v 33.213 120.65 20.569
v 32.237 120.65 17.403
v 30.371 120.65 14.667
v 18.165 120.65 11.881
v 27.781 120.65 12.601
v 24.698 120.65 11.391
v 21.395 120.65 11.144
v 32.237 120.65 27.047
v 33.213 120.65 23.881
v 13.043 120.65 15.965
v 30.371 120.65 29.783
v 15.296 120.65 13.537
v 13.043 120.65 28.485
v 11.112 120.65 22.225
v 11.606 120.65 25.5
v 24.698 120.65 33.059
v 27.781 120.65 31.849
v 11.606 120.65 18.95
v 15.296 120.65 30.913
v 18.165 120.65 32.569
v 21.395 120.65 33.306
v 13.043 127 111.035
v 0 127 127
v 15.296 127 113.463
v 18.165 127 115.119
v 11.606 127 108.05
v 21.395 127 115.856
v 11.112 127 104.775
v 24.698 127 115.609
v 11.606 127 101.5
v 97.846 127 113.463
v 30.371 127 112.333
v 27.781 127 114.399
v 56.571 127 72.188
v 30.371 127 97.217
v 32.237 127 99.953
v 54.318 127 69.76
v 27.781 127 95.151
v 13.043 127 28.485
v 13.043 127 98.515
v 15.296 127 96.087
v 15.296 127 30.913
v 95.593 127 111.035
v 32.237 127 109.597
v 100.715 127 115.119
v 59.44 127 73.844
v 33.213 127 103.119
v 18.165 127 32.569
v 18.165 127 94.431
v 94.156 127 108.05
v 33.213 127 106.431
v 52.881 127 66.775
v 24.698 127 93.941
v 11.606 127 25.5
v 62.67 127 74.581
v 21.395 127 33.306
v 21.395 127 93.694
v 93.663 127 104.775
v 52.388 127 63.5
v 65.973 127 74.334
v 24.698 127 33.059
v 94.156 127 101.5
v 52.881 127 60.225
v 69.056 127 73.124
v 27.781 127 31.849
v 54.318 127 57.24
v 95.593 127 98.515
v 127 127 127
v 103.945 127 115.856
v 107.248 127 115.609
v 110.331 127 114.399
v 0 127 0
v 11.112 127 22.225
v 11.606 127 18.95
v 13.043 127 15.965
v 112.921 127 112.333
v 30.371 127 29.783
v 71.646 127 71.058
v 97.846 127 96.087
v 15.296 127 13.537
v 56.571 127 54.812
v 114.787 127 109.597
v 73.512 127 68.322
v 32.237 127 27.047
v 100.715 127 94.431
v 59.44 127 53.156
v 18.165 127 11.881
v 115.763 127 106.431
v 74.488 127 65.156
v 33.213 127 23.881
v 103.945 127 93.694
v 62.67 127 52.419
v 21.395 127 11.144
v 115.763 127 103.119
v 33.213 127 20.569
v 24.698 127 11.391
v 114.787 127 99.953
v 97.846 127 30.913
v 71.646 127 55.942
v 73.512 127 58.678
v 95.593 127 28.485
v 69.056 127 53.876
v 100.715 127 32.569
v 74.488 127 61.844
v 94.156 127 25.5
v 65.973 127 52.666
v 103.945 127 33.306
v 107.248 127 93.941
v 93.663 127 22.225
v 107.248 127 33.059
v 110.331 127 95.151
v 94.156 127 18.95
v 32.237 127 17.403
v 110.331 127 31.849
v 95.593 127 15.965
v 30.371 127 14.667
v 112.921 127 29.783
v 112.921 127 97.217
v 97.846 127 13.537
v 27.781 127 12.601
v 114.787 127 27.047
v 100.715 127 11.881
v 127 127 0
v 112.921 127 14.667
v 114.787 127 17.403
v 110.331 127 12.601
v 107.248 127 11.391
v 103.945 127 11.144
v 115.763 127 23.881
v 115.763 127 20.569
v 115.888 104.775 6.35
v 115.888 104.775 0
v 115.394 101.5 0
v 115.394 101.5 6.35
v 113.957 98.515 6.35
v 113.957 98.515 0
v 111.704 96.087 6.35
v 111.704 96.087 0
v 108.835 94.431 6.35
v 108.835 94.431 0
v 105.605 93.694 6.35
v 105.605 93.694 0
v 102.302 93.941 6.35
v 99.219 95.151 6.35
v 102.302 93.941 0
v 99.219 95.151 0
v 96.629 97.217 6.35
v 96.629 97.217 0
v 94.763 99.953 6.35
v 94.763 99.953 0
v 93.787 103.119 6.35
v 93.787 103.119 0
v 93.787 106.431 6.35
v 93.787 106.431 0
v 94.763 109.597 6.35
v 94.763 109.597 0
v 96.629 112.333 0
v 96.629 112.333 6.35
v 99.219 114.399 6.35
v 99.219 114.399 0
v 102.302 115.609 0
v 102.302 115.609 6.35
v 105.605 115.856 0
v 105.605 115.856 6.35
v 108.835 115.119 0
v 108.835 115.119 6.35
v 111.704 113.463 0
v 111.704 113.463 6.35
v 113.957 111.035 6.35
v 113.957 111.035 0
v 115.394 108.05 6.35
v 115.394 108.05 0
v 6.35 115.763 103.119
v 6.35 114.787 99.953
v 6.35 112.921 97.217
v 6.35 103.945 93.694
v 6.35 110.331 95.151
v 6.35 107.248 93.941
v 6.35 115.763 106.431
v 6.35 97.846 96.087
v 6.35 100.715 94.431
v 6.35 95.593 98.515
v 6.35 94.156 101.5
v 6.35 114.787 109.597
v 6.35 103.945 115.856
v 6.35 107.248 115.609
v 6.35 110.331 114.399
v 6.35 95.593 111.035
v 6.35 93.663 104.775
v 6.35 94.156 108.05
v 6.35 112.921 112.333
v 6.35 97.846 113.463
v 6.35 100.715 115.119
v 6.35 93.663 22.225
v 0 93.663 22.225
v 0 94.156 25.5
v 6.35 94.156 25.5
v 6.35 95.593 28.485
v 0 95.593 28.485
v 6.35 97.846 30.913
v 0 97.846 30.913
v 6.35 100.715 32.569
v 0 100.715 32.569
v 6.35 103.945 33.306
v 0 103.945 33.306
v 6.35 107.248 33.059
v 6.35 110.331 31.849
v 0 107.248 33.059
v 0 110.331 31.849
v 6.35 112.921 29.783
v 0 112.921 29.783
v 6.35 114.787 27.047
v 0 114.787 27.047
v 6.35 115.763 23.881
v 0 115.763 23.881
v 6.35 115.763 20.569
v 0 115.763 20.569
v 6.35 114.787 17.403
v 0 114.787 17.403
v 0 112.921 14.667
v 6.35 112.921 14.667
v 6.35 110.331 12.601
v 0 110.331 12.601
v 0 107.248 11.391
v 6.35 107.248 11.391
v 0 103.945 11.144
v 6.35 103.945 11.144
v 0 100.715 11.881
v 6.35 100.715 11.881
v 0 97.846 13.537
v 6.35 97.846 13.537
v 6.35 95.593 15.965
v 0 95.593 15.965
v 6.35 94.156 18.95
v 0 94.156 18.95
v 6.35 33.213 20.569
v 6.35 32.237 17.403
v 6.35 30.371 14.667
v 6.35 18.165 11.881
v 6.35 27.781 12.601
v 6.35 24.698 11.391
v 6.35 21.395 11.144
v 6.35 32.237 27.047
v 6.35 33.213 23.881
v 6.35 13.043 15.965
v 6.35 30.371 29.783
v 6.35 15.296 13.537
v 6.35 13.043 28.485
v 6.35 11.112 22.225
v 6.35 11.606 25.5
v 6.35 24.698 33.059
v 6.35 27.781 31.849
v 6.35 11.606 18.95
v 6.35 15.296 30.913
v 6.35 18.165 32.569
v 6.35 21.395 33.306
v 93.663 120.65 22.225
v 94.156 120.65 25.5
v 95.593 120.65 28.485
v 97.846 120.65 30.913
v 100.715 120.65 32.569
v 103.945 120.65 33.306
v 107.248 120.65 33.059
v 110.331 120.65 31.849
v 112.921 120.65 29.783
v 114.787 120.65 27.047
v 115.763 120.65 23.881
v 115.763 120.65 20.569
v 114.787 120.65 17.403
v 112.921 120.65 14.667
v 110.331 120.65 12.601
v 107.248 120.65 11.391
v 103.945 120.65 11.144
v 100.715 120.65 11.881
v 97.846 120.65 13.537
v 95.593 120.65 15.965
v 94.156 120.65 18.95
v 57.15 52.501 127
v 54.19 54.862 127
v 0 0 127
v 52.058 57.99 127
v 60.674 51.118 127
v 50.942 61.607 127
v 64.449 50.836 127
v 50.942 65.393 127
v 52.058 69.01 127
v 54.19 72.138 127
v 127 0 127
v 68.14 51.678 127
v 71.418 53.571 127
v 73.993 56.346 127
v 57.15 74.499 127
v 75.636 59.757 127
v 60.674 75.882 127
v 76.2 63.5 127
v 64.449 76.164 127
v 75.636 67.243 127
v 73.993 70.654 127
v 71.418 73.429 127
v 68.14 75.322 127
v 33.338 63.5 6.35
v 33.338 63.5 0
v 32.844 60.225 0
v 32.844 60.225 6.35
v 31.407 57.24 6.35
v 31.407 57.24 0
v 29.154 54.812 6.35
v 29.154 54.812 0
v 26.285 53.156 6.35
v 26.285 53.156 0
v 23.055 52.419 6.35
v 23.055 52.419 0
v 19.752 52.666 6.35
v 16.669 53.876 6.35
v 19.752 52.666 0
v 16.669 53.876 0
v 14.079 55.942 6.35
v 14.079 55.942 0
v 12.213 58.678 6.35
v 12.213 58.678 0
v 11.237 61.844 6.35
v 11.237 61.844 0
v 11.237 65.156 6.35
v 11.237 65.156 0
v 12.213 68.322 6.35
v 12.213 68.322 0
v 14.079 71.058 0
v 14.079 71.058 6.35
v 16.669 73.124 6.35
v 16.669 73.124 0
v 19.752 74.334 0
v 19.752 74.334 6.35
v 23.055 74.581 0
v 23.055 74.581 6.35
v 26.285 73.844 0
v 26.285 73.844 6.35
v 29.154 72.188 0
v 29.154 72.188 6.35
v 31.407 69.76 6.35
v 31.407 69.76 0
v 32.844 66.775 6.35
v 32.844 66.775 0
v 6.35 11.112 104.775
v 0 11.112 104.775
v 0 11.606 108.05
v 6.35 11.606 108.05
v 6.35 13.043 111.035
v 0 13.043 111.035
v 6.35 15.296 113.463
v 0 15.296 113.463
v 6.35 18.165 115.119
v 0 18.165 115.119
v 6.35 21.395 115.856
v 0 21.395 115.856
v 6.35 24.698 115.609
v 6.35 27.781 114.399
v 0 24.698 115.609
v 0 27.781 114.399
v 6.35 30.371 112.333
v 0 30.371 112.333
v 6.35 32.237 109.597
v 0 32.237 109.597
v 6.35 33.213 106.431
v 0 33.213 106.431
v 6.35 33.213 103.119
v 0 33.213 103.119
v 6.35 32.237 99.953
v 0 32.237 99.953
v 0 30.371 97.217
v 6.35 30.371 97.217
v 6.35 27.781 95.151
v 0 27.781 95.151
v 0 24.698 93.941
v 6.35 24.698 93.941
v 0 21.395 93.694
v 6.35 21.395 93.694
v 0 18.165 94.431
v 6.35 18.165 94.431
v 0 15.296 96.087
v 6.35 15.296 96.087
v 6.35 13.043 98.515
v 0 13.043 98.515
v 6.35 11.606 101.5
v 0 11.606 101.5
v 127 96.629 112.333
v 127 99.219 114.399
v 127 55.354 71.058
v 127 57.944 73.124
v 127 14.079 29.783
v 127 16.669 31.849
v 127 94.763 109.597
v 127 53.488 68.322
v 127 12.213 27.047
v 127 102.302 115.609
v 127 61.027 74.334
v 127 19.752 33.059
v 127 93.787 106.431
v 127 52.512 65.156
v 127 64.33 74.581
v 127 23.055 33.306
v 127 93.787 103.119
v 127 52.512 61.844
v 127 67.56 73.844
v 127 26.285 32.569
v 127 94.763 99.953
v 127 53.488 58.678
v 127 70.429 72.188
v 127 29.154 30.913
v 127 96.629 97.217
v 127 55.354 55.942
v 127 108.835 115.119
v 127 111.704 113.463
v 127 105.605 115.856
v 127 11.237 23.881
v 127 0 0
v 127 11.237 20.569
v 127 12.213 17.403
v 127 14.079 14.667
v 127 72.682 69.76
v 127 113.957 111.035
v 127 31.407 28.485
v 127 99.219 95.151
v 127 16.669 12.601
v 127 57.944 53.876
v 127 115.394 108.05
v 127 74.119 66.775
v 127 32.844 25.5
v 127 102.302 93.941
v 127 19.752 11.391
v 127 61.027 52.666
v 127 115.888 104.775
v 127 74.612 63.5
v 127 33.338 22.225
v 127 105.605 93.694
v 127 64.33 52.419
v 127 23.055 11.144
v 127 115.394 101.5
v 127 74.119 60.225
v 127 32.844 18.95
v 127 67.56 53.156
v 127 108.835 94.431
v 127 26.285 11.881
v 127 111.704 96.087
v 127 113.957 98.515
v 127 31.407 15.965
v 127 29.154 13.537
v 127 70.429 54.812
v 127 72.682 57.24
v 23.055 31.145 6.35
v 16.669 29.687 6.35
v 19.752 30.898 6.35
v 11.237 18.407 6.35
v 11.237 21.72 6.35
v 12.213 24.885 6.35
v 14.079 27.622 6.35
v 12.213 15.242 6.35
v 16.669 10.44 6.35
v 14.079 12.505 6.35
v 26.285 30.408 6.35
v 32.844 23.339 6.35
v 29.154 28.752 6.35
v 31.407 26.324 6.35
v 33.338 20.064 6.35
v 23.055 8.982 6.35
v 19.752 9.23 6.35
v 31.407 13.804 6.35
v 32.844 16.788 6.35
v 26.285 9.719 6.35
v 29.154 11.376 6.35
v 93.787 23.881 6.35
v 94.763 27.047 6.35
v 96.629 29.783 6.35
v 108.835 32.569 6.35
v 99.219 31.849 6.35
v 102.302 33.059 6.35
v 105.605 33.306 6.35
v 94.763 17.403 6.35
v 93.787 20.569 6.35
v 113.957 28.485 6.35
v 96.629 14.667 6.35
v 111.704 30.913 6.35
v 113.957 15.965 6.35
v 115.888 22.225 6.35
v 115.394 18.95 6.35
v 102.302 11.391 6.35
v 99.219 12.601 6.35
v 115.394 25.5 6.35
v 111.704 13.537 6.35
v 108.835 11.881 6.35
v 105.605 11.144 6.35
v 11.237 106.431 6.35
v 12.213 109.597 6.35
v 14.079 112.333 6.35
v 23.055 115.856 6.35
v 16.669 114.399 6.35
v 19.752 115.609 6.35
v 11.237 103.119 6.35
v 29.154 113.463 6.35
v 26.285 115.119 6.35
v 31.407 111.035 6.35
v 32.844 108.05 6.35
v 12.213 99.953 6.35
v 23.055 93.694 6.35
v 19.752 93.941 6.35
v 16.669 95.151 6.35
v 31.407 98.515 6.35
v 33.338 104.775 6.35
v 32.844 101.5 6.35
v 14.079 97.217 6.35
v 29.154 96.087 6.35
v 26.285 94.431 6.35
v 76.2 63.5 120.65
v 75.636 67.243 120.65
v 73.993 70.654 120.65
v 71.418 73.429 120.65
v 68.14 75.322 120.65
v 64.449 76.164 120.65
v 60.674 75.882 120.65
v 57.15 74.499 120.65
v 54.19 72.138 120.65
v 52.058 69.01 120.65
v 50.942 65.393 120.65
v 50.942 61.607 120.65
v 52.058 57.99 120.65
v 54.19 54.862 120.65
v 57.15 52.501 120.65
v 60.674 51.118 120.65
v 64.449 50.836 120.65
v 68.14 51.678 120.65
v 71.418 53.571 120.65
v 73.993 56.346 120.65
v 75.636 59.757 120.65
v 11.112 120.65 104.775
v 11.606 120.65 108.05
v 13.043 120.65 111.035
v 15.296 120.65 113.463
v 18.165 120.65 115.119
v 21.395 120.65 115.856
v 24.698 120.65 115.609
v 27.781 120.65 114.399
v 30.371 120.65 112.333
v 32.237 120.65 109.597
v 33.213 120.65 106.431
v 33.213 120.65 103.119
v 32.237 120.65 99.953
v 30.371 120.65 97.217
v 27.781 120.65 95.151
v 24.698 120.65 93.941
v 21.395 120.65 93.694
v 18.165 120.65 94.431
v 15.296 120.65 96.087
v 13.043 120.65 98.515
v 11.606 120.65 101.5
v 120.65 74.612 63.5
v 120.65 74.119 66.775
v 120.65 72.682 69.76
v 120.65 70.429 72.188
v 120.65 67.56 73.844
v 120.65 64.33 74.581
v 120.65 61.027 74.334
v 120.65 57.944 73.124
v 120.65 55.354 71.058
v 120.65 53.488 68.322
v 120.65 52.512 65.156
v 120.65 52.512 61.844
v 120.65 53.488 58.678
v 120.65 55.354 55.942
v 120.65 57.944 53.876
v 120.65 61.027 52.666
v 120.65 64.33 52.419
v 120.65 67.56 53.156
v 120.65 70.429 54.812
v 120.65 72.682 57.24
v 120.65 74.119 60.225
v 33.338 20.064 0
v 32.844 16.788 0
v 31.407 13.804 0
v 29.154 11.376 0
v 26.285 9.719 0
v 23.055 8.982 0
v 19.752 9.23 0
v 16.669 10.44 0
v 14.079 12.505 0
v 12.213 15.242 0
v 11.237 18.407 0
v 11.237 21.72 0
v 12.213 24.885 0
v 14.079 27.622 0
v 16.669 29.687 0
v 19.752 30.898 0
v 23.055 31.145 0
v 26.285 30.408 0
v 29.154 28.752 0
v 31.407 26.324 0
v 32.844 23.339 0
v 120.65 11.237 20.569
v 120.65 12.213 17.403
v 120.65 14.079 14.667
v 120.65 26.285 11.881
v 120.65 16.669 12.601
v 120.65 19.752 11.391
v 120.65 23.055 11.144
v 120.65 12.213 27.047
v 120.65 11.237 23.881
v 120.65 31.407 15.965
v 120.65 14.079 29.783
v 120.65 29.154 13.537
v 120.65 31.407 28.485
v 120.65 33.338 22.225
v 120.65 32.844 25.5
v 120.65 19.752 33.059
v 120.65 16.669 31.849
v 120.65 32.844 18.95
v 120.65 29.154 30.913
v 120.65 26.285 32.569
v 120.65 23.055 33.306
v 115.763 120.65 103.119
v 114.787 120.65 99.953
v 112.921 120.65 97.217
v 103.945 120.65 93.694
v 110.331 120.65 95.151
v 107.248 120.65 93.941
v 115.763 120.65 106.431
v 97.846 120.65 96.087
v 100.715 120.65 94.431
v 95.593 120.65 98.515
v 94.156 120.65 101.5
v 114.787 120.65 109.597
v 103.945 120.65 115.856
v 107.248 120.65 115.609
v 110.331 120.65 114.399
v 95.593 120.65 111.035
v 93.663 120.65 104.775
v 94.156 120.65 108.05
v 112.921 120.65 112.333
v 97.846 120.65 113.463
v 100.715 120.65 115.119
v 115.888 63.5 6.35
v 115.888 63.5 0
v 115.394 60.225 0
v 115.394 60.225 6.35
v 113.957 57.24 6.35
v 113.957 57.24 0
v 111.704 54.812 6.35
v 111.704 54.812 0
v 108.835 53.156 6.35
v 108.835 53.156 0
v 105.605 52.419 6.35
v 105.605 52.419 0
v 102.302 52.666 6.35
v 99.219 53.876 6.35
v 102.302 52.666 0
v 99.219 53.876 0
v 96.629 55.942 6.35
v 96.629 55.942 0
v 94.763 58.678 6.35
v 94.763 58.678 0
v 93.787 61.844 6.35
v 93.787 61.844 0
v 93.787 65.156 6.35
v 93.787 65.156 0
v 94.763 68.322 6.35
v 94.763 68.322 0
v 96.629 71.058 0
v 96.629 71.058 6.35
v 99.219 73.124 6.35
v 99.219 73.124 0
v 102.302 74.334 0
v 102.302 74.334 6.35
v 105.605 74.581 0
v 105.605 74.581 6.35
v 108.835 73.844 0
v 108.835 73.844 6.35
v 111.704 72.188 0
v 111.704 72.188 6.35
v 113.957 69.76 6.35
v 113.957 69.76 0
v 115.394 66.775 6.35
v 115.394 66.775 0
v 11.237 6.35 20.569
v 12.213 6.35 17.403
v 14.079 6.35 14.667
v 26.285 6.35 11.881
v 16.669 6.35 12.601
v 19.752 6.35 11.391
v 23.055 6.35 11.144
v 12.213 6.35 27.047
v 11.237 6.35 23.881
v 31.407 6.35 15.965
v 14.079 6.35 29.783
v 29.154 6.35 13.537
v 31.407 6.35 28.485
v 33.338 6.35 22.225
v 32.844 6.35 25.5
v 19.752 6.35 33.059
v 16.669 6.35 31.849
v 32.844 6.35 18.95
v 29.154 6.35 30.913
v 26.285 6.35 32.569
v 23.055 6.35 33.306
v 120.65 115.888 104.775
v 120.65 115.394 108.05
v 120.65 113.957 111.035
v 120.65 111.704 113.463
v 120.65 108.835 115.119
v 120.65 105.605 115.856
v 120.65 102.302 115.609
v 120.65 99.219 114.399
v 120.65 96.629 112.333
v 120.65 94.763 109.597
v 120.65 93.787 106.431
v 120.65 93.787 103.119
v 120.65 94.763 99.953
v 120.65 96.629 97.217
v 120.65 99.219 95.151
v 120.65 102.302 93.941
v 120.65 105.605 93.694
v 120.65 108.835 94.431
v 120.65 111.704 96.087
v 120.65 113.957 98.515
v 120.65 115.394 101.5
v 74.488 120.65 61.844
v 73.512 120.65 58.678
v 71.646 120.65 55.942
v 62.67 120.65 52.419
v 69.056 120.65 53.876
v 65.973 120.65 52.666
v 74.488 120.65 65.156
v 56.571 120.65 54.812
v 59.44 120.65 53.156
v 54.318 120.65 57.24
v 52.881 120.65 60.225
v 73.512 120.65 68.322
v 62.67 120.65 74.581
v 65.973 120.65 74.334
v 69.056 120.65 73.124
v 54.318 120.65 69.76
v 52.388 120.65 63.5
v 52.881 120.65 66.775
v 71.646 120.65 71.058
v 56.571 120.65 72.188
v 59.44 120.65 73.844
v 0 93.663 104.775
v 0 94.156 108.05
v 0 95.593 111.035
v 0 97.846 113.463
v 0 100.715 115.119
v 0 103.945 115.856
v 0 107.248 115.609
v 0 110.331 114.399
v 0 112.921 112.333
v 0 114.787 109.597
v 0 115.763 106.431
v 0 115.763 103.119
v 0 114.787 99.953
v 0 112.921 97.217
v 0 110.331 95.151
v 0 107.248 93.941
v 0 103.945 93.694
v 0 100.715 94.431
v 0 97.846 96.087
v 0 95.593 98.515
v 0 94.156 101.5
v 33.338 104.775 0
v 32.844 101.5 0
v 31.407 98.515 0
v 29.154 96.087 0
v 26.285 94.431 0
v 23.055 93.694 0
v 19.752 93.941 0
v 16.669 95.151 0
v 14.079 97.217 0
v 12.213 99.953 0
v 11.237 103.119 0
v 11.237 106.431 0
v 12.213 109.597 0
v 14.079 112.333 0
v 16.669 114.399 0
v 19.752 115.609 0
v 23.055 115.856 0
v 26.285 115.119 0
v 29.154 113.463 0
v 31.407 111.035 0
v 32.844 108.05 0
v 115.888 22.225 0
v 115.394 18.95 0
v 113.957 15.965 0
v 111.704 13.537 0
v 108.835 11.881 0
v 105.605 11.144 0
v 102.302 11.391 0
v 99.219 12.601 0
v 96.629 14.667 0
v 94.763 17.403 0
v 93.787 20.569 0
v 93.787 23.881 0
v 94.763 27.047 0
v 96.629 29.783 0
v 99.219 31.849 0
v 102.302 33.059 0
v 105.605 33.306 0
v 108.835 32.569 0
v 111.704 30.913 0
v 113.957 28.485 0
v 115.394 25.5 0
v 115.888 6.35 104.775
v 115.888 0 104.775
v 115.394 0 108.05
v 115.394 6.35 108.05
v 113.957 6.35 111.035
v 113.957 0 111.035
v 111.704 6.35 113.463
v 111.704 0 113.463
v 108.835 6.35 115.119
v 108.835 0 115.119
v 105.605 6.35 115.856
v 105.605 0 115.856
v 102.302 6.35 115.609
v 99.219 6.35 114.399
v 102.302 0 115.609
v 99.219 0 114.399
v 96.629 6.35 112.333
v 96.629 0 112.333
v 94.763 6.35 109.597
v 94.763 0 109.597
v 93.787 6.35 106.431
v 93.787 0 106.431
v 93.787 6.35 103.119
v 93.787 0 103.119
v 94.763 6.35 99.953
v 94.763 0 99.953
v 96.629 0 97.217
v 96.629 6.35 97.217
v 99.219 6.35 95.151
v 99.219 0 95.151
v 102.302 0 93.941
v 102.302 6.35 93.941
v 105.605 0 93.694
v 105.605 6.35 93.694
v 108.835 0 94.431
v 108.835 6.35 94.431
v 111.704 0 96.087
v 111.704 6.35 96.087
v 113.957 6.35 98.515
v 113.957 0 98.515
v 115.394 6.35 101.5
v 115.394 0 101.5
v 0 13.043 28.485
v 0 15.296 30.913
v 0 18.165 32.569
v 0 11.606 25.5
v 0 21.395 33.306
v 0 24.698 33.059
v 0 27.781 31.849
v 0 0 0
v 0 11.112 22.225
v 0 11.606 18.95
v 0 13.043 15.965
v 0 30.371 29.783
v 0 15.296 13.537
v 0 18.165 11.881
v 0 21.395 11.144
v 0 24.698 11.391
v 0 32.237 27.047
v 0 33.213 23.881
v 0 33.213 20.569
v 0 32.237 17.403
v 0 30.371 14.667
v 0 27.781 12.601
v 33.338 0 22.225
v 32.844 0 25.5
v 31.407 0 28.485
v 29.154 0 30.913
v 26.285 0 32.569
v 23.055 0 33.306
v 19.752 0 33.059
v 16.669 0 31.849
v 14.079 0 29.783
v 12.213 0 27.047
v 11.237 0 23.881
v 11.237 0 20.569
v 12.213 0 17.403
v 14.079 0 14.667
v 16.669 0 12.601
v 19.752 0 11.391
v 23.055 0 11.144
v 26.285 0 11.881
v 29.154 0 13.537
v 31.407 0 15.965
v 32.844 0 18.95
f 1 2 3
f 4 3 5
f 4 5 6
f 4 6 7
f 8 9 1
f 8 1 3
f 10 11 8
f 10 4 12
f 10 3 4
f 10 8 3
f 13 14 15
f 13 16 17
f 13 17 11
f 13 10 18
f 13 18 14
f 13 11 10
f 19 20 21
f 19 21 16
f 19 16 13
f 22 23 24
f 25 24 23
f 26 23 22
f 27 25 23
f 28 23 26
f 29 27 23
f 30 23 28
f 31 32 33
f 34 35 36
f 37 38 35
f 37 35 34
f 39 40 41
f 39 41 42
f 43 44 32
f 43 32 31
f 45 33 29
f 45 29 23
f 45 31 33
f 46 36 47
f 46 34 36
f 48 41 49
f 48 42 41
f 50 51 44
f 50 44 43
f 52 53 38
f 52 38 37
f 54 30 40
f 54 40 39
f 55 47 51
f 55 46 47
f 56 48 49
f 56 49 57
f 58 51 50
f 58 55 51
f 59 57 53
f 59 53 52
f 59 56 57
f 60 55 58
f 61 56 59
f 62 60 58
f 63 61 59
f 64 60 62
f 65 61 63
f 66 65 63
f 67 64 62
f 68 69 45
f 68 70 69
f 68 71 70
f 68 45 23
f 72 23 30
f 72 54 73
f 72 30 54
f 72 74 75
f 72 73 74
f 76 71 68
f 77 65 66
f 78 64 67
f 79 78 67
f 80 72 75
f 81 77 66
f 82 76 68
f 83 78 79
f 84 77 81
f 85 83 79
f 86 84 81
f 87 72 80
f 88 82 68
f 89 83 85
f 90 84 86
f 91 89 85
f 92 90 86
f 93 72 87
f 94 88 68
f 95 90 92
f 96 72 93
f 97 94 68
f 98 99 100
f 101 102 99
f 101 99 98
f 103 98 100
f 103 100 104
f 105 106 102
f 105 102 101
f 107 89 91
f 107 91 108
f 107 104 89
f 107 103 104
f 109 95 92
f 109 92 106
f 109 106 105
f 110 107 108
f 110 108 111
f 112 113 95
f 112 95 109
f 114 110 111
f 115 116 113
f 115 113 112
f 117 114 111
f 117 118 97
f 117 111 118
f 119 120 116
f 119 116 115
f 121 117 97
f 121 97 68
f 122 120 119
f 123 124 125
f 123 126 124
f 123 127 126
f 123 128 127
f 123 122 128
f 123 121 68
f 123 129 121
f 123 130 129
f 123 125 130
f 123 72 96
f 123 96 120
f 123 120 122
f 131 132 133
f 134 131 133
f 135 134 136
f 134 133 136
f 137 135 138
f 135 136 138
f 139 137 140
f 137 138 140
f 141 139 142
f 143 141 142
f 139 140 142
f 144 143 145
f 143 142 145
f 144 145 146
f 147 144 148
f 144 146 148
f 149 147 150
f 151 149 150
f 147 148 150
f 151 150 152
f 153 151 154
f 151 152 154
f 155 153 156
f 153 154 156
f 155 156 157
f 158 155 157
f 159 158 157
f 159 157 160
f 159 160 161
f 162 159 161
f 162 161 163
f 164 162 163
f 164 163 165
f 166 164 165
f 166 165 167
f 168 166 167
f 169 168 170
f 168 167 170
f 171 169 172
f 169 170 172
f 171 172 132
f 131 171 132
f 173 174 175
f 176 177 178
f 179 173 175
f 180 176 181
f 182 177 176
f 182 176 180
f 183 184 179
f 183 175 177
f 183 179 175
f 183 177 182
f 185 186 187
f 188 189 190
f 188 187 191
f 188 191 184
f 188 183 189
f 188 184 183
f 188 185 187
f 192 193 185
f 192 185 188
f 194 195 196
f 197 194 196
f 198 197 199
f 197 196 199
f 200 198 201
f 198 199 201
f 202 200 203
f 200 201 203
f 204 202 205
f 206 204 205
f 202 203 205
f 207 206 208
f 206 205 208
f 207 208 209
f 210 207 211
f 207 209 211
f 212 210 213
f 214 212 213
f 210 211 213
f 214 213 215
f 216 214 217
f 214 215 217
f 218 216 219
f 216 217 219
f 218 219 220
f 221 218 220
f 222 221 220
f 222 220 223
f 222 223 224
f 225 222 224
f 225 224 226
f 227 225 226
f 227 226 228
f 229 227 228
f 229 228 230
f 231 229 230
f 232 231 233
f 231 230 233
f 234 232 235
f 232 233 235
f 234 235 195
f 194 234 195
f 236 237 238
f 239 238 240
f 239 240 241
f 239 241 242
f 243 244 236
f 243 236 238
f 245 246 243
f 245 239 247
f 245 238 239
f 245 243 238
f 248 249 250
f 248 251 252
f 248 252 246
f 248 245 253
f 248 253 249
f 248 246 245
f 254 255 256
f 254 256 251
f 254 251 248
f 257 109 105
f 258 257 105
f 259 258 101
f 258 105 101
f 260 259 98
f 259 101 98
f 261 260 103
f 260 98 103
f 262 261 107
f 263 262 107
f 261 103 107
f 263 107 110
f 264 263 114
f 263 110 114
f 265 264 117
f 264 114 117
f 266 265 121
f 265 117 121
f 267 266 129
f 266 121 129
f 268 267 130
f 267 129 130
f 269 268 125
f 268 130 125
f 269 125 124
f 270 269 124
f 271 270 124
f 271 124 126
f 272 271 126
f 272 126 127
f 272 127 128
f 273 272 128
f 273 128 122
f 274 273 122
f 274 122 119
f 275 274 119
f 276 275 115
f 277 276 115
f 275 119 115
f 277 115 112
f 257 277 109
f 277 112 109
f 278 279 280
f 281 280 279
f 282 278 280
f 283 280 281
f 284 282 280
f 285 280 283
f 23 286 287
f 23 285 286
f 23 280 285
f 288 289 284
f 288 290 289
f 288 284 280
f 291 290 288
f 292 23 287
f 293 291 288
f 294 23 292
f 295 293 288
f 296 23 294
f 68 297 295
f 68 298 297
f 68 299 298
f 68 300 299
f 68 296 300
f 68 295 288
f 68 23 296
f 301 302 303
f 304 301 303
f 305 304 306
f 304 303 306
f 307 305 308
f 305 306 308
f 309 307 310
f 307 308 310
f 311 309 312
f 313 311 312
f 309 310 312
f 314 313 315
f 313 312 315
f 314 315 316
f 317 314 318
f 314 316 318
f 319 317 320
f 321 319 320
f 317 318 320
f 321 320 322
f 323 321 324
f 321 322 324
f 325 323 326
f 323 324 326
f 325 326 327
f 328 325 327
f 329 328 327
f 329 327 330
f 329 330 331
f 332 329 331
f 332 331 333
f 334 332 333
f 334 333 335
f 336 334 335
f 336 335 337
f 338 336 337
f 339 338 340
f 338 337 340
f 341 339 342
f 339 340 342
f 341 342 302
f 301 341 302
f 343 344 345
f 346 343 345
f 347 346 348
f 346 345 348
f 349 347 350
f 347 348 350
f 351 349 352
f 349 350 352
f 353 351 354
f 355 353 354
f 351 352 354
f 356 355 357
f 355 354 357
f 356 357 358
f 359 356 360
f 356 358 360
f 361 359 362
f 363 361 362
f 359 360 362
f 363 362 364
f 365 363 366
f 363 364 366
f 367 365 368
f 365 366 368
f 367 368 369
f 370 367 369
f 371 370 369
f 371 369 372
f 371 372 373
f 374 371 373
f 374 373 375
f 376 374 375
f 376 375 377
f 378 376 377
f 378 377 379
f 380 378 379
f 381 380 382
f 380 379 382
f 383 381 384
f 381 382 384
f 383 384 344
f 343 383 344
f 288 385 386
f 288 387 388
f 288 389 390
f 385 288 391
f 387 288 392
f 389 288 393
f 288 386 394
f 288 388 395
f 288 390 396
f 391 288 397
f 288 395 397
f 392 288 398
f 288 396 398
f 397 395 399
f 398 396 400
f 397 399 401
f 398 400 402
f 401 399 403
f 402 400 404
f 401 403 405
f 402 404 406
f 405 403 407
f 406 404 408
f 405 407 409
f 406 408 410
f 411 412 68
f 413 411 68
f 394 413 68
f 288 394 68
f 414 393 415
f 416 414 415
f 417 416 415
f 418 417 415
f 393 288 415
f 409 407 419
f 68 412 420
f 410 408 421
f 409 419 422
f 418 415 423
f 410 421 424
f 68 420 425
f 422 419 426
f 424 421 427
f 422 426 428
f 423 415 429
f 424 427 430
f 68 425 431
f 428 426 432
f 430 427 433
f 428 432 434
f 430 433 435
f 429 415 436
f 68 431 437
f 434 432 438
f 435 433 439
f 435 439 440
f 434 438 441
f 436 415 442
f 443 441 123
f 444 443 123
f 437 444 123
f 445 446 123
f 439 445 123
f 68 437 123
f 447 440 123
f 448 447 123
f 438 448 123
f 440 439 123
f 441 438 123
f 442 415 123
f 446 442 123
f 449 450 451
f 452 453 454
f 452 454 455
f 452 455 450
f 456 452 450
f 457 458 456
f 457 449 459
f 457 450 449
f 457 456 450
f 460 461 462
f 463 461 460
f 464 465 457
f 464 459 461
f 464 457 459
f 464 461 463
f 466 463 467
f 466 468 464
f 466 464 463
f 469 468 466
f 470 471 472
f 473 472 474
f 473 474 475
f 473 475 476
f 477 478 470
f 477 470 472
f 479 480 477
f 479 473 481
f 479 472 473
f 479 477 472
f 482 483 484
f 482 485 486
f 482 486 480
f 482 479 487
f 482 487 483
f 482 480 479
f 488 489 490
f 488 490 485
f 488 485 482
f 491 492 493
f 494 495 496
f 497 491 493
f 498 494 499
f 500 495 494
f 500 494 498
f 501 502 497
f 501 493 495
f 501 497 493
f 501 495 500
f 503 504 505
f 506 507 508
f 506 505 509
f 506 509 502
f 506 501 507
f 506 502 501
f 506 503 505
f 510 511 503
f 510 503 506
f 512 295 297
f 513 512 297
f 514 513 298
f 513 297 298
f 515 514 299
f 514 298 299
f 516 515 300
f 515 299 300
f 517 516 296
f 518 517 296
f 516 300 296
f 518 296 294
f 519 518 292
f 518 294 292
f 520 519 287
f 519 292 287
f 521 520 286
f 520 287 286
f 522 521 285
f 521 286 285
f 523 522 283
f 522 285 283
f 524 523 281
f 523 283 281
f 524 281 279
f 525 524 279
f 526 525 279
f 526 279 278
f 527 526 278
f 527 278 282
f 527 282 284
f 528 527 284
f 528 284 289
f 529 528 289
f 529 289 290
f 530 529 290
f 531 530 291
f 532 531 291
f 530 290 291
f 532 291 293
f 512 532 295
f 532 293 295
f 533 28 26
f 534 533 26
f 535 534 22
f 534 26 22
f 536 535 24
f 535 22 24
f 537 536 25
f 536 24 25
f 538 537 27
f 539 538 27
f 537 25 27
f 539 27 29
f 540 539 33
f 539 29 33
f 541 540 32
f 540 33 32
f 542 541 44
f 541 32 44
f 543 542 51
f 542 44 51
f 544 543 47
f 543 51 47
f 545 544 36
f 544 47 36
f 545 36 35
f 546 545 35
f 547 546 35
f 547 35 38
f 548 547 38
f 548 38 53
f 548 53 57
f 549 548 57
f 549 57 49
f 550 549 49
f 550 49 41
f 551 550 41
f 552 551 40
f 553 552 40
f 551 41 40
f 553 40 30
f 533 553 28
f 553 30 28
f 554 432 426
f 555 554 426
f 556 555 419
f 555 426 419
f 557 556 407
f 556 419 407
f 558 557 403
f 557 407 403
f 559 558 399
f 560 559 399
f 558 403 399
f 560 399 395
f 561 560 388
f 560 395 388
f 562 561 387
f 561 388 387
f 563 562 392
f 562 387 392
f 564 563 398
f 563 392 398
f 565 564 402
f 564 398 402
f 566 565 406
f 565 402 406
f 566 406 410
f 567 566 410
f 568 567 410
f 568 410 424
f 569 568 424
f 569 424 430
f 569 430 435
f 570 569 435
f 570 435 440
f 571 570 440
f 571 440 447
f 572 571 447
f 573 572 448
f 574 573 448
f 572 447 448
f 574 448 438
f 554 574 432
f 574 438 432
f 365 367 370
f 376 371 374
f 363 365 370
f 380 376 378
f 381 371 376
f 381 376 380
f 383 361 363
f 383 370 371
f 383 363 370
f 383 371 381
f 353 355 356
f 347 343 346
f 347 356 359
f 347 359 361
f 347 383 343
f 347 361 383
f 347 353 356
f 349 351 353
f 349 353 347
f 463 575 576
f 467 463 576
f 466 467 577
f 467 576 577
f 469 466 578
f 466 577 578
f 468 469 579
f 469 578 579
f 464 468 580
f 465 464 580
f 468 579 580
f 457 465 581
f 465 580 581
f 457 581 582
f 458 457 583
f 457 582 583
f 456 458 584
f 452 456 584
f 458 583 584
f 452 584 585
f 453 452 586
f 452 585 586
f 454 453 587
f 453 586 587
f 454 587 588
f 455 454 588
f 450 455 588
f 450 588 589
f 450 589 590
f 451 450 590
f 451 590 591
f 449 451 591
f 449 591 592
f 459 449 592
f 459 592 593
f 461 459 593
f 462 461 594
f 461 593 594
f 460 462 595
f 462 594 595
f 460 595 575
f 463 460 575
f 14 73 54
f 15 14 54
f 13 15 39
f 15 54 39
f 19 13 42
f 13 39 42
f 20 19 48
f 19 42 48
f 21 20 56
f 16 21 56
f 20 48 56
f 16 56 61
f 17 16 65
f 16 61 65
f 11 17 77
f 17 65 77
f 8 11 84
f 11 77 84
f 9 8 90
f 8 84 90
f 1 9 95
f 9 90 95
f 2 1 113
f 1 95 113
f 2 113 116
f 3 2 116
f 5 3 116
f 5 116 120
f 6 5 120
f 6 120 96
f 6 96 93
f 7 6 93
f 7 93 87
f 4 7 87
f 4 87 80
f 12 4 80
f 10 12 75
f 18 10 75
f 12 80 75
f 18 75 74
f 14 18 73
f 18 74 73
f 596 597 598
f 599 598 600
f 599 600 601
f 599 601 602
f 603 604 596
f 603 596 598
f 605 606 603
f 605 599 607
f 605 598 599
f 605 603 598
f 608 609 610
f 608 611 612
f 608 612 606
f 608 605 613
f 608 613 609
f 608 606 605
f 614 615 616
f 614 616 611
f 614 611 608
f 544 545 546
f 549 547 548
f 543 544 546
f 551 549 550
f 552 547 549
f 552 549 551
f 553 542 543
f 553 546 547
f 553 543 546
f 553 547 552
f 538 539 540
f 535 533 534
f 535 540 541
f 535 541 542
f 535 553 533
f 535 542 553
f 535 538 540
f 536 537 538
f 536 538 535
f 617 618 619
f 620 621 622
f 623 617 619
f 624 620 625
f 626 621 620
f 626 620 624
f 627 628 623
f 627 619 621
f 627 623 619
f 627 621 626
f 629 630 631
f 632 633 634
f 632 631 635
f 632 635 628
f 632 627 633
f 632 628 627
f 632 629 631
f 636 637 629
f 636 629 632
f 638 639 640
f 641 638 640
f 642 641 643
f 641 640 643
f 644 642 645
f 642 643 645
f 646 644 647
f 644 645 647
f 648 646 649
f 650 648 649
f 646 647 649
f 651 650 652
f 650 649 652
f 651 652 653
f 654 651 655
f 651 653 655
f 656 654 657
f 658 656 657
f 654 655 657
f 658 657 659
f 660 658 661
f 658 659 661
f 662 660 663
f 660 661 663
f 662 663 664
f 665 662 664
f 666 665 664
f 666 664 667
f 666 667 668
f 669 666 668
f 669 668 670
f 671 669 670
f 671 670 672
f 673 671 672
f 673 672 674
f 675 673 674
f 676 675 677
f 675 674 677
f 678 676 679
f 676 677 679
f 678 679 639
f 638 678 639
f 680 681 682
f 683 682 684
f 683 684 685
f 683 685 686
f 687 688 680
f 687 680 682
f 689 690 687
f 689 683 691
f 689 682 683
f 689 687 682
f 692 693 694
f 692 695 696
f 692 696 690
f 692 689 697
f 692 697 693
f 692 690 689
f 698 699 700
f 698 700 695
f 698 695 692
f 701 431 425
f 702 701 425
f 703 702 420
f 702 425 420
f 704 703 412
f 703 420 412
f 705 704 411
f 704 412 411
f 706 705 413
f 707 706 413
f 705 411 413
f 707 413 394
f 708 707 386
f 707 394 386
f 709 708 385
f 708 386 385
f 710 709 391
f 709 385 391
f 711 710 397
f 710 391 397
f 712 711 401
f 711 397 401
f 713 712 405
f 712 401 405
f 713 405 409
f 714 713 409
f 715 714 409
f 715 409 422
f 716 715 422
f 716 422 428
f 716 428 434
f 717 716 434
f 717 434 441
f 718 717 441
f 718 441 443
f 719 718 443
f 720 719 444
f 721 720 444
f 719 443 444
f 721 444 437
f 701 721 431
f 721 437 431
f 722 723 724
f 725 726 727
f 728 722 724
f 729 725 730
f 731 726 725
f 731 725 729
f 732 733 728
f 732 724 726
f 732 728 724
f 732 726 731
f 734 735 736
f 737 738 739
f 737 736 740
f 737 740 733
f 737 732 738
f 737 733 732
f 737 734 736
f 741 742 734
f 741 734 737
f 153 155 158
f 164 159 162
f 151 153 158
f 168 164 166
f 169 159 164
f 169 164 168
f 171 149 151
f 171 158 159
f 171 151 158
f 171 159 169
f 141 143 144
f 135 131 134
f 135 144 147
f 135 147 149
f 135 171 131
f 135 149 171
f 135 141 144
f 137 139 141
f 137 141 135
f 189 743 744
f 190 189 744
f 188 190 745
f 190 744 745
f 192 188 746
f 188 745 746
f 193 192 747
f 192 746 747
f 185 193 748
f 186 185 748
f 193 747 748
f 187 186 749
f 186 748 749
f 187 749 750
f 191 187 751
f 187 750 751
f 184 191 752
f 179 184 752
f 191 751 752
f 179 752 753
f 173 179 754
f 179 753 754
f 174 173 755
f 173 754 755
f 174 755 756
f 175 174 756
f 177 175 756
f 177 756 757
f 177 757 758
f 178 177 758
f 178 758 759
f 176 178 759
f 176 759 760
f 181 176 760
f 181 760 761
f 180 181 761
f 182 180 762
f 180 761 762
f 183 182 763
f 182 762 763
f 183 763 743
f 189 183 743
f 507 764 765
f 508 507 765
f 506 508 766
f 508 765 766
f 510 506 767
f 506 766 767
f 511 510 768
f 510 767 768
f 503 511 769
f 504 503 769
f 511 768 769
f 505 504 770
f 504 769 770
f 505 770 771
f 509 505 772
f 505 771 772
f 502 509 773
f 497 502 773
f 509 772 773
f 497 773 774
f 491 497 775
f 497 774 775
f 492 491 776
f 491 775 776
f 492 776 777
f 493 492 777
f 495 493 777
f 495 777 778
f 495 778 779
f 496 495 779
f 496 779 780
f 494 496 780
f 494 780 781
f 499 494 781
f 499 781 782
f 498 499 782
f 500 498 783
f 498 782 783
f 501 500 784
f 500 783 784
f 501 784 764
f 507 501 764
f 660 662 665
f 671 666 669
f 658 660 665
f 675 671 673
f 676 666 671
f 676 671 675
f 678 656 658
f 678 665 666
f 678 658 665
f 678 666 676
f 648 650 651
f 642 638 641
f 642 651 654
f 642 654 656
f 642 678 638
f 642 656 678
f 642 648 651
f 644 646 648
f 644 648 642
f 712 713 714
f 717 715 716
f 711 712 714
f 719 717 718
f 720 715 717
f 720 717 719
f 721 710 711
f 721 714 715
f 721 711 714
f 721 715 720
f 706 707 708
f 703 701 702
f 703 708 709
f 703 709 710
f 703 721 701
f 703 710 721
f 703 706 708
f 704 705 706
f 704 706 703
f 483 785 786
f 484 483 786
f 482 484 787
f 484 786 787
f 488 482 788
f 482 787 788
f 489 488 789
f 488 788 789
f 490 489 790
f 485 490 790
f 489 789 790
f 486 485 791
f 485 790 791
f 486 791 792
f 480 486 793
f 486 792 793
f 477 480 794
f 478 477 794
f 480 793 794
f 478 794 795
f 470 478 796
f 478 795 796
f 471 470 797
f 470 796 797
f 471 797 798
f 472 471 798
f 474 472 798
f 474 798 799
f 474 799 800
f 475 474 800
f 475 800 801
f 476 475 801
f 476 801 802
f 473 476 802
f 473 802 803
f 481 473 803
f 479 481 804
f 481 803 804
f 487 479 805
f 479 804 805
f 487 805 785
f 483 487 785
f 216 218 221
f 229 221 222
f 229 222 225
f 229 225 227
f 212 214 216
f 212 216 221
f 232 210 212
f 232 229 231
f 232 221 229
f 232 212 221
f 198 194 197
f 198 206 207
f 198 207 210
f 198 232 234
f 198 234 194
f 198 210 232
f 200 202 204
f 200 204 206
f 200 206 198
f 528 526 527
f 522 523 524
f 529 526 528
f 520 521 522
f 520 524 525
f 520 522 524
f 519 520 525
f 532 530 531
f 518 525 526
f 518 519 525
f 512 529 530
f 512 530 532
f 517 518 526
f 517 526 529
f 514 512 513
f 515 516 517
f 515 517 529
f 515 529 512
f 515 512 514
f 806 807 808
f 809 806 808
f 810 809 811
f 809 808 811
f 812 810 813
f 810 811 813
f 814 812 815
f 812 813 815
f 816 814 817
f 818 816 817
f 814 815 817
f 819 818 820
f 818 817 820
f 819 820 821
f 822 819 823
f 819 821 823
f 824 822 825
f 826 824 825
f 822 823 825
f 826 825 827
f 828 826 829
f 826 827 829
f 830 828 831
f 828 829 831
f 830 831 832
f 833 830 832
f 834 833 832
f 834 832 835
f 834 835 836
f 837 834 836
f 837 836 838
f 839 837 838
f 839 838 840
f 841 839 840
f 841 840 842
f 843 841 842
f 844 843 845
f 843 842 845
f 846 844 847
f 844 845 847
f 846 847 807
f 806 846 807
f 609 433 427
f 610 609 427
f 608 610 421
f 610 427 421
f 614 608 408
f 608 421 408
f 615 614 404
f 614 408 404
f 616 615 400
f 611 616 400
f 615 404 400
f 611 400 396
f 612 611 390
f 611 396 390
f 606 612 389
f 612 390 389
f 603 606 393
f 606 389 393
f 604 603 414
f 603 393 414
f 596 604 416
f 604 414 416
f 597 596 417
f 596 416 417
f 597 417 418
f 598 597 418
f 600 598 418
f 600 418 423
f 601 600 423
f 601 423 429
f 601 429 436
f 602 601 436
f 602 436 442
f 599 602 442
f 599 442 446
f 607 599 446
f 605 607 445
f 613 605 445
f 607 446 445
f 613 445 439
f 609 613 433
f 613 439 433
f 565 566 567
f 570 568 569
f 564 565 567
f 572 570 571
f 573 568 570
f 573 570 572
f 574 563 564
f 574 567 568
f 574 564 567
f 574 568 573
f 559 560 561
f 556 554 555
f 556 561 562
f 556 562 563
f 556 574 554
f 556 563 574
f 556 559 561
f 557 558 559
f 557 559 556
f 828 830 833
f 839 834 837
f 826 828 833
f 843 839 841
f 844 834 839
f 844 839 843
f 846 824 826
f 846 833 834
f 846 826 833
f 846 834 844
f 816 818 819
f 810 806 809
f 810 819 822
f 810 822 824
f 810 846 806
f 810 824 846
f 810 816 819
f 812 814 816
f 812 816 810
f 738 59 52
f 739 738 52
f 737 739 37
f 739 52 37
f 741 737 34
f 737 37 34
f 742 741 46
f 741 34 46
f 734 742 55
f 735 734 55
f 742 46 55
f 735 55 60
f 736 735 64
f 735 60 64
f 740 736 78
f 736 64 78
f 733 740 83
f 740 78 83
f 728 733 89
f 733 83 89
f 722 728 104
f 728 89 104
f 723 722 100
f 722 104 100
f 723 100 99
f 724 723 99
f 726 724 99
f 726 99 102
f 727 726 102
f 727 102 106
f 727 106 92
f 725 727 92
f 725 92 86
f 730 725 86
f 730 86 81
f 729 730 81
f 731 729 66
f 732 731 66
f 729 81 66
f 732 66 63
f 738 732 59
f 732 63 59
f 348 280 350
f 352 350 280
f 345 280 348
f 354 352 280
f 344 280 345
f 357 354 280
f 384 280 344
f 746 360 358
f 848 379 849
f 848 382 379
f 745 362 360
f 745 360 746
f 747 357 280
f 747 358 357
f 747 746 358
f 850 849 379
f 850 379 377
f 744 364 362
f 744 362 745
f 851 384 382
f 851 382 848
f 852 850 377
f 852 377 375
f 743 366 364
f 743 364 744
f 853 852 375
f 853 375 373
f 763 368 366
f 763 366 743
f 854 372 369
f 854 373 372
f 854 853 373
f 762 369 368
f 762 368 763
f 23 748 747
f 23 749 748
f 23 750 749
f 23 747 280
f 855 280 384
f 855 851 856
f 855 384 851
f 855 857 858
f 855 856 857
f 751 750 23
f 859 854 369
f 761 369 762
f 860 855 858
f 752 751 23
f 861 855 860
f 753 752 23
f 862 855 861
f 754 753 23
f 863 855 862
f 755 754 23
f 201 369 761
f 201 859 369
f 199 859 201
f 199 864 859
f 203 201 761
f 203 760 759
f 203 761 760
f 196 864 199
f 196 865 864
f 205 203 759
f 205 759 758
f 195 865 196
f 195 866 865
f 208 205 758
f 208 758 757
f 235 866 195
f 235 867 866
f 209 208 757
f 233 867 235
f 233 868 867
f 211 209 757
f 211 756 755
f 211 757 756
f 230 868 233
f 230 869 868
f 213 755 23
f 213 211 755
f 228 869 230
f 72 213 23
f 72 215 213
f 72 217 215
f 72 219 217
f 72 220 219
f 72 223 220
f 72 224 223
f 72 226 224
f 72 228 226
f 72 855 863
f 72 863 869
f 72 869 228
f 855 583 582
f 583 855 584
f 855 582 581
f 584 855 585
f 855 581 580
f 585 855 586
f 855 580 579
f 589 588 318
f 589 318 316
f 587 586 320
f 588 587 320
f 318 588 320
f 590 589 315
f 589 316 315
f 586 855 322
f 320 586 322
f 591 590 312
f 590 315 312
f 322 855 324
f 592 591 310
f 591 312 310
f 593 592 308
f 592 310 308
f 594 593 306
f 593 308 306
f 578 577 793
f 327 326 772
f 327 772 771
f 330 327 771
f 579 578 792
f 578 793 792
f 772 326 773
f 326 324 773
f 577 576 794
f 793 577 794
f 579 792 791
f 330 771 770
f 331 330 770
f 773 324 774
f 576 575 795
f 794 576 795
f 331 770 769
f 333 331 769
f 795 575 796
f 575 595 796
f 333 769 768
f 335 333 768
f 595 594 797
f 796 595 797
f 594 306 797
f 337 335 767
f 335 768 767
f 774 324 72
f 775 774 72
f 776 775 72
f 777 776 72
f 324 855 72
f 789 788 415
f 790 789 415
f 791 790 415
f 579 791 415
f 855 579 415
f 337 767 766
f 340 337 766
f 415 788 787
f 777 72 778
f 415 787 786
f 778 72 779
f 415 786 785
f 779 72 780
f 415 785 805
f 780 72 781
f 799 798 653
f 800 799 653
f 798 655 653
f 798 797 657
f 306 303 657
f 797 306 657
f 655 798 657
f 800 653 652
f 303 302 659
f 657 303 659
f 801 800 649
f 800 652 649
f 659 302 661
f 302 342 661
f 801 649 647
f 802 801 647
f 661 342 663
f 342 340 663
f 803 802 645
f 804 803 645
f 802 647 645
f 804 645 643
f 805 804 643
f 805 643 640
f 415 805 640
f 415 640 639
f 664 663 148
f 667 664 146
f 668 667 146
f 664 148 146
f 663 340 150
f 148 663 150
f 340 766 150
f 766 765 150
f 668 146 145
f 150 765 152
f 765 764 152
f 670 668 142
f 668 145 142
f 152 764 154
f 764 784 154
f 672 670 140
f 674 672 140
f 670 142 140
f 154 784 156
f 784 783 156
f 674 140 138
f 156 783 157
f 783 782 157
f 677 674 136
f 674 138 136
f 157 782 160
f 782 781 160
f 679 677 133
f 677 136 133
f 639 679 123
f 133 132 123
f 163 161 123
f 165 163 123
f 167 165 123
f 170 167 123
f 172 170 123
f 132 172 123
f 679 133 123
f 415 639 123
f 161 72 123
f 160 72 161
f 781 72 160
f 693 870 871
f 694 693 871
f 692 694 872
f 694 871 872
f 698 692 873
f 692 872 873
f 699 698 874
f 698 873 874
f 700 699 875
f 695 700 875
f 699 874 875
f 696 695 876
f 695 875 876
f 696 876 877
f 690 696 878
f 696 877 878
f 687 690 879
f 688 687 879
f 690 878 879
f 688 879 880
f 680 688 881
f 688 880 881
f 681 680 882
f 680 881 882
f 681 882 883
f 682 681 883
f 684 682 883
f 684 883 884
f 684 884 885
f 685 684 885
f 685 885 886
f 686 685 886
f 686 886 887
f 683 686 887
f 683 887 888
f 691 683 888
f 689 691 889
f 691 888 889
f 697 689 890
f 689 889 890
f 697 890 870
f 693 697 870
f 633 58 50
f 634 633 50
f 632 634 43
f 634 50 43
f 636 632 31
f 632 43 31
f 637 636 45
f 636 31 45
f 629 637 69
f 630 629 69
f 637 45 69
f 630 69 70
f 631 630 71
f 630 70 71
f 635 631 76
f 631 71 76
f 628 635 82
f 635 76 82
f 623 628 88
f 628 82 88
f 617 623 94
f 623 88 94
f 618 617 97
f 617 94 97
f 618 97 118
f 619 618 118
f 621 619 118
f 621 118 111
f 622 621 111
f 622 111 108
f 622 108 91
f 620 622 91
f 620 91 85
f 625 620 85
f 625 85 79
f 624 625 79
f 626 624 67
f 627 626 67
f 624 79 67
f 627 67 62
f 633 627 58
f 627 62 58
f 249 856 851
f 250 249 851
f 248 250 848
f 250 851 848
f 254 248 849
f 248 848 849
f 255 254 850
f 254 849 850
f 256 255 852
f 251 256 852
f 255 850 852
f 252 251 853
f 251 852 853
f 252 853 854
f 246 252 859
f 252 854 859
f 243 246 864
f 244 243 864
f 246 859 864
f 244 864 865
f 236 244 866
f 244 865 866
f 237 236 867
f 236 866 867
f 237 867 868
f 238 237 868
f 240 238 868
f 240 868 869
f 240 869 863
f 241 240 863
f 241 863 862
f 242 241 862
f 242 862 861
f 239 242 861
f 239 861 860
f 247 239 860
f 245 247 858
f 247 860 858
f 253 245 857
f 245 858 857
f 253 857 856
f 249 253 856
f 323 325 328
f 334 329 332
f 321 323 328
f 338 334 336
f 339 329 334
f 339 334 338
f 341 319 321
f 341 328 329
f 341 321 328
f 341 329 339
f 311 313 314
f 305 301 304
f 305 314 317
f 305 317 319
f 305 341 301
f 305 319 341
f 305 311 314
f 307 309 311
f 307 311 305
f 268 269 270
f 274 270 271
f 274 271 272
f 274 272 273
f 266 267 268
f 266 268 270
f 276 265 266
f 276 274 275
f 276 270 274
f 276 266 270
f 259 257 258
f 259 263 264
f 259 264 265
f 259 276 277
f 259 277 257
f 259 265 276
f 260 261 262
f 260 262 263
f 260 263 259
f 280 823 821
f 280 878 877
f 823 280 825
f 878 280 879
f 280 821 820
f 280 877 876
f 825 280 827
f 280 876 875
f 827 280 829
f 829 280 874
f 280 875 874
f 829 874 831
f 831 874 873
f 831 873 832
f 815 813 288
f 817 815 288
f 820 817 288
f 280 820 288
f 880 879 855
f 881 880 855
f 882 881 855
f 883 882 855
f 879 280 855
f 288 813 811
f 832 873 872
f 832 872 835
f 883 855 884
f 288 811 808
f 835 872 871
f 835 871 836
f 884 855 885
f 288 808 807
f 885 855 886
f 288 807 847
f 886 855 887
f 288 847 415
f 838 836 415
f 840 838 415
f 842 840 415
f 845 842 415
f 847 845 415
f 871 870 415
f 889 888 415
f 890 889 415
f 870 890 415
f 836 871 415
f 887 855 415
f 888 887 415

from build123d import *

# Parameters (mm, degrees)
F0_W      = 127
F0_H      = 127
F1_DEPTH  = 127
F2_R      = 12.7
F3_DEPTH  = 6.35
F4_R      = 11.1125
F5_DEPTH  = 6.35
F6_R      = 11.1125
F7_DEPTH  = 6.35
F8_R      = 11.1125
F9_DEPTH  = 6.35
F10_R     = 11.1125
F11_DEPTH = 6.35
F12_R     = 11.1125
F13_DEPTH = 6.35


with BuildPart() as f1:
    # F0 (on Top) → F1 (new body)
    with BuildSketch(Plane.XY):
        with Locations((63.5, 63.5)):
            Rectangle(F0_W, F0_H)
    extrude(amount=F1_DEPTH)

    # F2 (on face) → F3 (cut)
    with BuildSketch(Plane.XY.offset(127)):
        with Locations((63.5, 63.5)):
            Circle(F2_R)
    extrude(amount=-F3_DEPTH, mode=Mode.SUBTRACT)

    # F4 (on face) → F5 (cut)
    with BuildSketch(Plane.XZ):
        with Locations((22.225, 22.225)):
            Circle(F4_R)
        with Locations((104.775, 104.775)):
            Circle(F4_R)
    extrude(amount=-F5_DEPTH, mode=Mode.SUBTRACT)

    # F6 (on face) → F7 (cut)
    with BuildSketch(Plane.YZ.offset(127)):
        with Locations((63.5, 63.5)):
            Circle(F6_R)
        with Locations((22.225, 22.225)):
            Circle(F6_R)
        with Locations((104.775, 104.775)):
            Circle(F6_R)
    extrude(amount=-F7_DEPTH, mode=Mode.SUBTRACT)

    # F8 (on face) → F9 (cut)
    with BuildSketch(Plane(origin=(0, 0, 0), x_dir=(0, -1, 0), z_dir=(-1, 0, 0))):
        with Locations((-104.775, 104.775)):
            Circle(F8_R)
        with Locations((-104.775, 22.225)):
            Circle(F8_R)
        with Locations((-22.225, 104.775)):
            Circle(F8_R)
        with Locations((-22.225, 22.225)):
            Circle(F8_R)
    extrude(amount=-F9_DEPTH, mode=Mode.SUBTRACT)

    # F10 (on face) → F11 (cut)
    with BuildSketch(Plane(origin=(0, 127, 0), x_dir=(-1, 0, 0), z_dir=(0, 1, 0))):
        with Locations((-104.775, 104.775)):
            Circle(F10_R)
        with Locations((-63.5, 63.5)):
            Circle(F10_R)
        with Locations((-22.225, 22.225)):
            Circle(F10_R)
        with Locations((-104.775, 22.225)):
            Circle(F10_R)
        with Locations((-22.225, 104.775)):
            Circle(F10_R)
    extrude(amount=-F11_DEPTH, mode=Mode.SUBTRACT)

    # F12 (on face) → F13 (cut)
    with BuildSketch(Plane(origin=(0, 0, 0), x_dir=(1, 0, 0), z_dir=(0, 0, -1))):
        with Locations((104.775, -104.775)):
            Circle(F12_R)
        with Locations((104.775, -63.5)):
            Circle(F12_R)
        with Locations((104.775, -22.225)):
            Circle(F12_R)
        with Locations((22.225, -63.5)):
            Circle(F12_R)
        with Locations((22.225, -104.775)):
            Circle(F12_R)
        with Locations((22.225, -20.063723)):
            Circle(F12_R)
    extrude(amount=-F13_DEPTH, mode=Mode.SUBTRACT)


solid = f1.part
